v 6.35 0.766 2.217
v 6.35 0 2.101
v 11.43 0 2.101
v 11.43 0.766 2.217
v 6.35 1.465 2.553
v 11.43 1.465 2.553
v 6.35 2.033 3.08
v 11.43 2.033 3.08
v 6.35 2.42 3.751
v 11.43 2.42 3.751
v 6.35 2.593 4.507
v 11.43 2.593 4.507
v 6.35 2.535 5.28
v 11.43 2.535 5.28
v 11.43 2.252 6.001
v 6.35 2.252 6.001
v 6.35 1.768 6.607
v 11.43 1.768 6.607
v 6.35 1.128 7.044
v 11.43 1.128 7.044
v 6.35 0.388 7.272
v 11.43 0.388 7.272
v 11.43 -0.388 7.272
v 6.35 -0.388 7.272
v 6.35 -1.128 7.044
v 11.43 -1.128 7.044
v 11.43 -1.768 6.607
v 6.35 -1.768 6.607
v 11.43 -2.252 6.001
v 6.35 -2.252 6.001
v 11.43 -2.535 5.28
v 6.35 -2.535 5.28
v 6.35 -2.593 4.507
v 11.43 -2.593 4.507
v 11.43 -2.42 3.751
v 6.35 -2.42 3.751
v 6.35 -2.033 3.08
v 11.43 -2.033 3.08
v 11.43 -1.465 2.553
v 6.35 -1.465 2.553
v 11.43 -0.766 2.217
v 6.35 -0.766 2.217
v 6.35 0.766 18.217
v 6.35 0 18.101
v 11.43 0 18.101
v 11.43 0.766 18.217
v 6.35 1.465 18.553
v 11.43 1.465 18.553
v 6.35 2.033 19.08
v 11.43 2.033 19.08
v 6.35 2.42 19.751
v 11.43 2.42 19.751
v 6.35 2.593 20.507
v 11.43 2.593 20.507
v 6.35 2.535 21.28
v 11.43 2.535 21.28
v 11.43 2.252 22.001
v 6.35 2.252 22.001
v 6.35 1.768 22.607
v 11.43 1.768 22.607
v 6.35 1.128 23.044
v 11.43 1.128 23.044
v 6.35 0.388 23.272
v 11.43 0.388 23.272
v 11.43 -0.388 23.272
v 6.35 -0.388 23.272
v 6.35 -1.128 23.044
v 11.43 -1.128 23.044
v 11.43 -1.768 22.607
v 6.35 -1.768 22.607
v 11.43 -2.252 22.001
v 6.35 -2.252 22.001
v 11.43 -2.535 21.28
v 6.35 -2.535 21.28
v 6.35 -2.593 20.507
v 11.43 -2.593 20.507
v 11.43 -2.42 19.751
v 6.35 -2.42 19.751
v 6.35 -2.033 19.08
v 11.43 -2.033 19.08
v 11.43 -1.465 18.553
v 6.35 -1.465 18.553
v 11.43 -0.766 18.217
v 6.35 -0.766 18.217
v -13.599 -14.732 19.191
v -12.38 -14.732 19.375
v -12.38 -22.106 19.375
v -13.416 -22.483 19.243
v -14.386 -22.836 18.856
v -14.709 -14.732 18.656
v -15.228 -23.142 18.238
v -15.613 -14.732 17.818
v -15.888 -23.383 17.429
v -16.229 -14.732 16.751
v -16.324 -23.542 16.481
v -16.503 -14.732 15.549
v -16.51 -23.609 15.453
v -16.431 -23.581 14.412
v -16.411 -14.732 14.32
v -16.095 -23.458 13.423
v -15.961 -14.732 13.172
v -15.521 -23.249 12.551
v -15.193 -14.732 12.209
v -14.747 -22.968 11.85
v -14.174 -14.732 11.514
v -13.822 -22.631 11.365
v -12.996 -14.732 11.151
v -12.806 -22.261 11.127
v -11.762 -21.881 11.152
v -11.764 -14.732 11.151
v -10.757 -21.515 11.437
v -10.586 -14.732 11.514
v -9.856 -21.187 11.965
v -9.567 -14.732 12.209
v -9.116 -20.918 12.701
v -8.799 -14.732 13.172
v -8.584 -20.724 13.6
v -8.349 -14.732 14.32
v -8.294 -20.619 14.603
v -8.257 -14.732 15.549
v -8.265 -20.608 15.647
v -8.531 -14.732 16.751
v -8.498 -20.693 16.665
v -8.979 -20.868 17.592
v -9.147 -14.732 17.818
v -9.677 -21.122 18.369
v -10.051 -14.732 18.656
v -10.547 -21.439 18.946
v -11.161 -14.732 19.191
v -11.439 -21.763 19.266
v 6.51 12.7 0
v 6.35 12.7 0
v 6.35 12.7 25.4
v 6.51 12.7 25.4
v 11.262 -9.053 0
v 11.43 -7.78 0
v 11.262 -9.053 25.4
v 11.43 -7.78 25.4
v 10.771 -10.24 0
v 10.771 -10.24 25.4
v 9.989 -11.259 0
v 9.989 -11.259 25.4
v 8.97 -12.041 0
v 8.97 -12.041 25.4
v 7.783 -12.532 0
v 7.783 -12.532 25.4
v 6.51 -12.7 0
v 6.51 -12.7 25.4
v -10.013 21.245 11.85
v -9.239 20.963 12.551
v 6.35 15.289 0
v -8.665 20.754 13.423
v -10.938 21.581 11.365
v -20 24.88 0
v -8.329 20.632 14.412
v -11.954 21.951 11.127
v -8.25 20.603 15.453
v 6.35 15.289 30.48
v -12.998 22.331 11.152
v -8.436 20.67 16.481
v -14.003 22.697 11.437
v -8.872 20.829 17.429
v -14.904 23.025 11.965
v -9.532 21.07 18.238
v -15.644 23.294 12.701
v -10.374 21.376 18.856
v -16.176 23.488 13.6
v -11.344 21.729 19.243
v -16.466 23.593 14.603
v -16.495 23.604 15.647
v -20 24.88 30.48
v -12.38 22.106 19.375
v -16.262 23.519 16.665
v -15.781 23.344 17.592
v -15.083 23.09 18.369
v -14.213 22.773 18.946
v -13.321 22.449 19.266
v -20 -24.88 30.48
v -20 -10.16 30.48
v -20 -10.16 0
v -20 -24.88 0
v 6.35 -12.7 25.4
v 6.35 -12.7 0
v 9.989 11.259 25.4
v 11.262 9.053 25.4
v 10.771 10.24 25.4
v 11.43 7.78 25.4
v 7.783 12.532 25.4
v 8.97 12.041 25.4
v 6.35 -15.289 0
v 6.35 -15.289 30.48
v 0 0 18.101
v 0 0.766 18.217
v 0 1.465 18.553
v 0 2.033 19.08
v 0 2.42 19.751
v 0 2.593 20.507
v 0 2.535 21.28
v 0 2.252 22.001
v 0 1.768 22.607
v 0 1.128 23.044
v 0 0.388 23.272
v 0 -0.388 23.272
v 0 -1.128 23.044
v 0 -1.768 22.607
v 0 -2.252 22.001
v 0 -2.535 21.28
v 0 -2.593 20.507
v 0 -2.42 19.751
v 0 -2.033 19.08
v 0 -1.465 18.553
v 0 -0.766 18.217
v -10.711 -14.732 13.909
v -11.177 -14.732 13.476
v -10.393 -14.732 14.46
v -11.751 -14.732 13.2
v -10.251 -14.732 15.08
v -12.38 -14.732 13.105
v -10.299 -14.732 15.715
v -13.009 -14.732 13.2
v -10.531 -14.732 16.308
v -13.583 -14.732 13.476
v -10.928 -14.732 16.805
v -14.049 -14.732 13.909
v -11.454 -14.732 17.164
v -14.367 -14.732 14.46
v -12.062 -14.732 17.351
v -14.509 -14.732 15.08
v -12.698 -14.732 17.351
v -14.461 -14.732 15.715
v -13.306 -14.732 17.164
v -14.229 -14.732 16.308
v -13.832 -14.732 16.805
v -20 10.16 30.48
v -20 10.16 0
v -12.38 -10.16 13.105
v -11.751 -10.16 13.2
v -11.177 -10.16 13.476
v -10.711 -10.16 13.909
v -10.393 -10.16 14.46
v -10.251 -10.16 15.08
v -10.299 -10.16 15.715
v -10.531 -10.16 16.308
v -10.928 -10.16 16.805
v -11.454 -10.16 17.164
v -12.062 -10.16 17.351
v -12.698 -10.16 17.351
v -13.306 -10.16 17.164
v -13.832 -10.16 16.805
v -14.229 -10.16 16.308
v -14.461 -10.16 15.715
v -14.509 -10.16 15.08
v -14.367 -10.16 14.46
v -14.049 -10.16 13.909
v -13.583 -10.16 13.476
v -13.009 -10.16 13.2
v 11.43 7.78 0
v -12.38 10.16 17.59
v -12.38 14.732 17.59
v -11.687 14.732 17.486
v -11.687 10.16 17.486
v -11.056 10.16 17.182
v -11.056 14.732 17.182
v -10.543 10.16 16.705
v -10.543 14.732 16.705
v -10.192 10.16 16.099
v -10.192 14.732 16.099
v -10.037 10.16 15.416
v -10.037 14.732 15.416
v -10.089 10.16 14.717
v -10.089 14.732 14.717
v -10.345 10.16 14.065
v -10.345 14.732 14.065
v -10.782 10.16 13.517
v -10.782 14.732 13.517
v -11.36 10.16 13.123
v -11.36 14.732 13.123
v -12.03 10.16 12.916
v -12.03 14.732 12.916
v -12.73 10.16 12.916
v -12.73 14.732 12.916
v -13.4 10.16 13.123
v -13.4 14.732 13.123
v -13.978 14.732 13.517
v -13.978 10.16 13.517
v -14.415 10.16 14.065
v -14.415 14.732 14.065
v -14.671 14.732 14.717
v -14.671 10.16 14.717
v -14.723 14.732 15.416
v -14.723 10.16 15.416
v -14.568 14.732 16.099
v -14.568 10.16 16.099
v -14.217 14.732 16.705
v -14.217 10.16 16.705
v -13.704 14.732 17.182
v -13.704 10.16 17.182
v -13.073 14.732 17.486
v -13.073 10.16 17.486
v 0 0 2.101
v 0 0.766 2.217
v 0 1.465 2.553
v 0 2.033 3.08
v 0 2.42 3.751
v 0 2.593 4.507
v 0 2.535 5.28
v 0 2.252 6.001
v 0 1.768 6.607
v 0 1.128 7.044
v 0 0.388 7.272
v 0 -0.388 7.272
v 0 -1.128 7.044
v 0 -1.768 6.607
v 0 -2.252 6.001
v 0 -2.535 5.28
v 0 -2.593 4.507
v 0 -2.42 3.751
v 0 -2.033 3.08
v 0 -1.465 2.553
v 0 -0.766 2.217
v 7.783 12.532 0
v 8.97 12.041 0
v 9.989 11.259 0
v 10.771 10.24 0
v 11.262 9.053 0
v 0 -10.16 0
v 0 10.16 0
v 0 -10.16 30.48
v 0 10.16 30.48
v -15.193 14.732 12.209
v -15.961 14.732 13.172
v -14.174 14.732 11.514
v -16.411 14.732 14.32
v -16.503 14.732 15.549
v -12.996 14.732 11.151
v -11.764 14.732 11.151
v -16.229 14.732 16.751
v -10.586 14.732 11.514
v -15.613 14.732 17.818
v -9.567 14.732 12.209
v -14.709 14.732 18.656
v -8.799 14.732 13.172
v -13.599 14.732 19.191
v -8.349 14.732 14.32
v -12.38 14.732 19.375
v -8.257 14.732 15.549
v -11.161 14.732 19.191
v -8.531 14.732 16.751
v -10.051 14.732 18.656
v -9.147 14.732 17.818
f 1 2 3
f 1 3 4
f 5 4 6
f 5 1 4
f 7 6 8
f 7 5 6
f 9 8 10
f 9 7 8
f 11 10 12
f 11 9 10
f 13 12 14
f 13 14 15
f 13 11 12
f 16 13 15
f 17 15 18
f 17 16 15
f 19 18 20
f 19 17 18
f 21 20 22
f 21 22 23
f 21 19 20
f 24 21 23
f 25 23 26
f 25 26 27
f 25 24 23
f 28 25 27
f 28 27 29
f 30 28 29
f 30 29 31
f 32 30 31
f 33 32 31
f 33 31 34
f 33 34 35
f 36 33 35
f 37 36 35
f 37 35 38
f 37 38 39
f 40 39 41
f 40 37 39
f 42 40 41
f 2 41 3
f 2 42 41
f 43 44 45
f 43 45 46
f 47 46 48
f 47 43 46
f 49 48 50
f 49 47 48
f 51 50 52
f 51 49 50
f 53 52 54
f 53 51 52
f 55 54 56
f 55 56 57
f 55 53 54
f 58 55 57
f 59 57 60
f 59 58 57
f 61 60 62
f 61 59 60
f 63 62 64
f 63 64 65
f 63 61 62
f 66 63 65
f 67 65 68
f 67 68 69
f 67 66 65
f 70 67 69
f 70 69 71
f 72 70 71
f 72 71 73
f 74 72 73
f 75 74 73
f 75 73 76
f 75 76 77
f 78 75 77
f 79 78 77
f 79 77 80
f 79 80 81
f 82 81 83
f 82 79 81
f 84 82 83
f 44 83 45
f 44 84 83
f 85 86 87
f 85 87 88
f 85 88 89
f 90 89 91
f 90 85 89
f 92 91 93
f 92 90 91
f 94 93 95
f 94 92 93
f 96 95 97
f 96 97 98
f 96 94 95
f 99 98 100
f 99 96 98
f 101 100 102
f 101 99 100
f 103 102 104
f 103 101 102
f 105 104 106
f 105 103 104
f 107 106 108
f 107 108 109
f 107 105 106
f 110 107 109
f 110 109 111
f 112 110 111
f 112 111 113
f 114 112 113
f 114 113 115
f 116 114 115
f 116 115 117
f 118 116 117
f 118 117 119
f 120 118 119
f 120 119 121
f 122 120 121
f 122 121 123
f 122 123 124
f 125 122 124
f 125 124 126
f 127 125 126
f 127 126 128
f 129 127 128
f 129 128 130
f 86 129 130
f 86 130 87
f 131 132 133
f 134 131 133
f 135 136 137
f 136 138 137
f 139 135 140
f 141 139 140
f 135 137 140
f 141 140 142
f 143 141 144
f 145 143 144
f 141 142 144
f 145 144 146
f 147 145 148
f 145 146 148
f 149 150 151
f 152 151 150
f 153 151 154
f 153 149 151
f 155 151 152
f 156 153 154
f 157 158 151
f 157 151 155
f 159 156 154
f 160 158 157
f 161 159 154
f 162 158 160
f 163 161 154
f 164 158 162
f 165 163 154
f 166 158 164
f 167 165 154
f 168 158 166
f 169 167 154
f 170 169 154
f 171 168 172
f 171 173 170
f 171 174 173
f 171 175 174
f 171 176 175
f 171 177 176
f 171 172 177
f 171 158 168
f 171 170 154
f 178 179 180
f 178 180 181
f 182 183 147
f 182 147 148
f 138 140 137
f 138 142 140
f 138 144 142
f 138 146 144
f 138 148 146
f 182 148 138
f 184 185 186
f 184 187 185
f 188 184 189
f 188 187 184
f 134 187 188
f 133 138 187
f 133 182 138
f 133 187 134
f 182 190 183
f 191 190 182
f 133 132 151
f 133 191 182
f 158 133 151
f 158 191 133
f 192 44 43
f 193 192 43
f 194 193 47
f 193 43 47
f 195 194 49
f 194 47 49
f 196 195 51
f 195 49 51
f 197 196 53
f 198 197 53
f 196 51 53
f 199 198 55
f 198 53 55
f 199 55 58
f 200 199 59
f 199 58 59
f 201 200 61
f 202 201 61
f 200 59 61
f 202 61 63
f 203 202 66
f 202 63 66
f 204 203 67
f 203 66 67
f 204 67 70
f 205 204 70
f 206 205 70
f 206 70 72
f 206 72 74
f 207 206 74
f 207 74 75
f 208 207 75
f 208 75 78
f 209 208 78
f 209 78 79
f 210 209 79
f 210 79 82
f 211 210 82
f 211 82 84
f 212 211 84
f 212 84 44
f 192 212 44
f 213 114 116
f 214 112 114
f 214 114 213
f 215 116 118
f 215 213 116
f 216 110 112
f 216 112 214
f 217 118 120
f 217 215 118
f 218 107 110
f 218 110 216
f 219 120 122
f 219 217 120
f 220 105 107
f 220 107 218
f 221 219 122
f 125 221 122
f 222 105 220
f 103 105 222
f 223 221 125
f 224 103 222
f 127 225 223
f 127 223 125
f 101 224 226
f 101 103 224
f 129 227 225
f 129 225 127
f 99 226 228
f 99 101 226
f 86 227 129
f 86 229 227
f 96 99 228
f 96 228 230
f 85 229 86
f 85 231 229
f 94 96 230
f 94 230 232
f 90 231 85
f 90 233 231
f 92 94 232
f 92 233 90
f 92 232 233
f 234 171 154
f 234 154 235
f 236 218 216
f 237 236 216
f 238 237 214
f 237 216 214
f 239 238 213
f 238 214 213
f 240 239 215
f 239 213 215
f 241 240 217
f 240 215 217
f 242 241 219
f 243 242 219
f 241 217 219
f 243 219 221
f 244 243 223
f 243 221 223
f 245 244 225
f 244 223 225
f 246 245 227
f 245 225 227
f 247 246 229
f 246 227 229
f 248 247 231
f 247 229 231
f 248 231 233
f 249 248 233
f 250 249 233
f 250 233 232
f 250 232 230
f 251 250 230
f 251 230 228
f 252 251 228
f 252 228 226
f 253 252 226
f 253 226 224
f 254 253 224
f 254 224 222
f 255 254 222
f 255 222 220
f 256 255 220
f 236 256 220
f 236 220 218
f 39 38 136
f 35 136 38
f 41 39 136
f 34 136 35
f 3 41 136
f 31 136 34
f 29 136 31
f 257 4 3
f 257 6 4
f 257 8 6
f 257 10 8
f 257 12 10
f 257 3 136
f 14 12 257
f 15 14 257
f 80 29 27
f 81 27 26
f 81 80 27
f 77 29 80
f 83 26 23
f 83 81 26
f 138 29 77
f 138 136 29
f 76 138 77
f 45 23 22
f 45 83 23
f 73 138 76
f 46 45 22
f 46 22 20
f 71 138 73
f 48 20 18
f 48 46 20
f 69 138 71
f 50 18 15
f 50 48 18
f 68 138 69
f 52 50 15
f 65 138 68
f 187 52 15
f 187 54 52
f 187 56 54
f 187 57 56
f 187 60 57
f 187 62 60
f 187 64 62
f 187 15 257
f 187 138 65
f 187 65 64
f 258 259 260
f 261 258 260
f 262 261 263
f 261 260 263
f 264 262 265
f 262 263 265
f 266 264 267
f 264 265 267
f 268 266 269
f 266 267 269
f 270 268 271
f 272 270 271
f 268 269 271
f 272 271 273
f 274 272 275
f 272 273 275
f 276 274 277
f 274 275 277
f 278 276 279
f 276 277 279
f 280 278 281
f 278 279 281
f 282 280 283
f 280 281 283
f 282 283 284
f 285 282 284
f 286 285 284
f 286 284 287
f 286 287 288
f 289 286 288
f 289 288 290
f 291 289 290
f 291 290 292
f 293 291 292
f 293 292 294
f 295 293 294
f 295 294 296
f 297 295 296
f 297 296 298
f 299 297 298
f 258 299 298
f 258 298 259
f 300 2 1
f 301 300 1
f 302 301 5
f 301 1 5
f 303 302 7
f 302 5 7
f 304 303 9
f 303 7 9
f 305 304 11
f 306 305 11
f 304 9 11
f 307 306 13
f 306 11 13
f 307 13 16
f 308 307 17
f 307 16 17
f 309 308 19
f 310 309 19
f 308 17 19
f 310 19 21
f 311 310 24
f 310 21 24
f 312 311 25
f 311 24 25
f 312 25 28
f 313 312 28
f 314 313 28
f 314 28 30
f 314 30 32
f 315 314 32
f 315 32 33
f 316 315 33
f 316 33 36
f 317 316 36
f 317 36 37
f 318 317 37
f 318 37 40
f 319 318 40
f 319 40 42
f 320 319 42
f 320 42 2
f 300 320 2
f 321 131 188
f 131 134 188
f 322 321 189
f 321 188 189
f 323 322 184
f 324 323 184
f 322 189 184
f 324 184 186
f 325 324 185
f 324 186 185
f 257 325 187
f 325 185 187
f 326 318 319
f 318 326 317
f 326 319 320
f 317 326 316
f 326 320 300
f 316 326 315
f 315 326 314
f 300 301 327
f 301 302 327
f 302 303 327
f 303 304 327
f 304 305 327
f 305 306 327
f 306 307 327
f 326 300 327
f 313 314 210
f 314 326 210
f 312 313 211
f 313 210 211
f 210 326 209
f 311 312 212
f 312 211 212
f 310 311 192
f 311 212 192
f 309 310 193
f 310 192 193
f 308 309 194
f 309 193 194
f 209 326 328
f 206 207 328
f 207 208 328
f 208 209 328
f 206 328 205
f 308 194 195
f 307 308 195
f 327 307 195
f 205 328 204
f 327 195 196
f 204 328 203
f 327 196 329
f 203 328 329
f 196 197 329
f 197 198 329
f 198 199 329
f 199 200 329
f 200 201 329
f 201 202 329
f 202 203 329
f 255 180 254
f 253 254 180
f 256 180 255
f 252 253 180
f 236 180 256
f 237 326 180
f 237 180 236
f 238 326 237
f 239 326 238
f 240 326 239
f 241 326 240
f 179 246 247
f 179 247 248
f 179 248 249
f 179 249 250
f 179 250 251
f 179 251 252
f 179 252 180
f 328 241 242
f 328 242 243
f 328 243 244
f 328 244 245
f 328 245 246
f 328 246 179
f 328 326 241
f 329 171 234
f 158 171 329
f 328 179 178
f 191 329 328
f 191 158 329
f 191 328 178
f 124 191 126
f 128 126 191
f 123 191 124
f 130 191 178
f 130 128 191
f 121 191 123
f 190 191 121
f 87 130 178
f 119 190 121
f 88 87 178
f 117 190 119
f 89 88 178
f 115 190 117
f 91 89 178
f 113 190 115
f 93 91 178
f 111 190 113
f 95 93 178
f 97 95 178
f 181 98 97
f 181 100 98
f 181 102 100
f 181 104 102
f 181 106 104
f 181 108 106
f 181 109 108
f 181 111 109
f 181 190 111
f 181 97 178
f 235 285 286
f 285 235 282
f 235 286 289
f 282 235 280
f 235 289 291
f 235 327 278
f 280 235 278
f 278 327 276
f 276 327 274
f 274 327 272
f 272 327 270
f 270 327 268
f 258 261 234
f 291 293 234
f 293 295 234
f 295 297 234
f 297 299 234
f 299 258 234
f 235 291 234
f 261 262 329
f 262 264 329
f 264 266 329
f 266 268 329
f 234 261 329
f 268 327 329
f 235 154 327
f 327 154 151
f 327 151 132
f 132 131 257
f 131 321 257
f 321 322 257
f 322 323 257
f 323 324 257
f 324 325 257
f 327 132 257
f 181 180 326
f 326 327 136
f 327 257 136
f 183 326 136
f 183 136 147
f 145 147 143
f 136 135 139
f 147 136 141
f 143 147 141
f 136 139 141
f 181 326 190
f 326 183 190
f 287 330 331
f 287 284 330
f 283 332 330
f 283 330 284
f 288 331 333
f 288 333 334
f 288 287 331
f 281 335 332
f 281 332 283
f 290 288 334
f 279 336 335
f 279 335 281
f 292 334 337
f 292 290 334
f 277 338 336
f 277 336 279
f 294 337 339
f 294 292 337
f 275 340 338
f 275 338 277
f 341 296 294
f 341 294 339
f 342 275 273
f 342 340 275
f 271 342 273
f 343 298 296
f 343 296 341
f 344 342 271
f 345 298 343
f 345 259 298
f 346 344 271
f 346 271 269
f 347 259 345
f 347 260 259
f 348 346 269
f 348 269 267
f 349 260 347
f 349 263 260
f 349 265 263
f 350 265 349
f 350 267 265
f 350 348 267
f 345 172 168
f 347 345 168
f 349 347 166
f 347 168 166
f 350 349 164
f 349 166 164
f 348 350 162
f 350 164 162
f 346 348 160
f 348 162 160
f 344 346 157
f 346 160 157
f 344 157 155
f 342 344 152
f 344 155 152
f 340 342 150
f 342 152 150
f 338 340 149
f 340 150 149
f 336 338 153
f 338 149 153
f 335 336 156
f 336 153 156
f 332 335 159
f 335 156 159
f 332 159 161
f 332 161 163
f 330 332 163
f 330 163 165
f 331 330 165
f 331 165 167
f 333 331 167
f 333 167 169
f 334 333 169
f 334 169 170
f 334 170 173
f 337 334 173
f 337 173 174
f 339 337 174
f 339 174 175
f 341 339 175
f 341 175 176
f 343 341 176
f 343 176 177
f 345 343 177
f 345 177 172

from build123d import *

# Parameters (mm, degrees)
SKETCH3_W           = 50.8
SKETCH3_H           = 30.48
BOSS_EXTRUDE1_DEPTH = 6.35
SKETCH4_W           = 15.24
SKETCH4_H           = 30.48
BOSS_EXTRUDE2_DEPTH = 20
SKETCH5_R           = 4.135
CUT_EXTRUDE1_DEPTH  = 10.668
SKETCH6_R           = 2.35
CUT_EXTRUDE2_DEPTH  = 8
CUT_EXTRUDE3_START  = -10.668
SKETCH7_R           = 4.135
CUT_EXTRUDE3_DEPTH  = 10.668
SKETCH8_R           = 2.135
CUT_EXTRUDE4_DEPTH  = 8
SKETCH10_W          = 25.4
SKETCH10_H          = 25.4
SKETCH10_R          = 2.6
BOSS_EXTRUDE4_DEPTH = 5.08
CHAMFER1_SIZE       = 10.111093108
CHAMFER1_SIZE_2     = 27.78
FILLET2_R           = 4.92
SKETCH12_R          = 2.6
CUT_EXTRUDE6_DEPTH  = 48.353389985
SKETCH13_R          = 2.6
CUT_EXTRUDE7_DEPTH  = 48.353389985


with BuildPart() as part:
    # Sketch3 → Boss-Extrude1 (new body)
    with BuildSketch(Plane.YZ):
        with Locations((0, 15.24)):
            Rectangle(SKETCH3_W, SKETCH3_H)
    extrude(amount=BOSS_EXTRUDE1_DEPTH)

    # Sketch4 → Boss-Extrude2 (add)
    with BuildSketch(Plane(origin=(0, 0, 0), x_dir=(0, -1, 0), z_dir=(-1, 0, 0))):
        with Locations((-17.78, 15.24)):
            Rectangle(SKETCH4_W, SKETCH4_H)
        with Locations((17.78, 15.24)):
            Rectangle(SKETCH4_W, SKETCH4_H)
    extrude(amount=BOSS_EXTRUDE2_DEPTH)

    # Sketch5 → Cut-Extrude1 (cut)
    with BuildSketch(Plane(origin=(0, 25.4, 0), x_dir=(-1, 0, 0), z_dir=(0, 1, 0))):
        with Locations(Location((12.38, 15.24, 0), (0, 0, 90))):
            Circle(SKETCH5_R)
    extrude(amount=-CUT_EXTRUDE1_DEPTH, mode=Mode.SUBTRACT)

    # Sketch6 → Cut-Extrude2 (cut)
    with BuildSketch(Plane(origin=(0, 14.732, 0), x_dir=(-1, 0, 0), z_dir=(0, 1, 0))):
        with Locations(Location((12.38, 15.24, 0), (0, 0, 90))):
            Circle(SKETCH6_R)
    extrude(amount=-CUT_EXTRUDE2_DEPTH, mode=Mode.SUBTRACT)

    # Sketch7 → Cut-Extrude3 (cut)
    with BuildSketch(Plane.XZ.offset(25.4).offset(CUT_EXTRUDE3_START)):
        with Locations(Location((-12.38, 15.24, 0), (0, 0, 90))):
            Circle(SKETCH7_R)
    extrude(amount=CUT_EXTRUDE3_DEPTH, mode=Mode.SUBTRACT)

    # Sketch8 → Cut-Extrude4 (cut)
    with BuildSketch(Plane.XZ.offset(14.732)):
        with Locations(Location((-12.38, 15.24, 0), (0, 0, 270))):
            Circle(SKETCH8_R)
    extrude(amount=-CUT_EXTRUDE4_DEPTH, mode=Mode.SUBTRACT)

    # Sketch10 → Boss-Extrude4 (add)
    with BuildSketch(Plane.YZ.offset(6.35)):
        with Locations((0, 12.7)):
            Rectangle(SKETCH10_W, SKETCH10_H)
        with Locations(Location((0, 20.701, 0), (0, 0, 270))):
            Circle(SKETCH10_R, mode=Mode.SUBTRACT)
        with Locations(Location((0, 4.701, 0), (0, 0, 270))):
            Circle(SKETCH10_R, mode=Mode.SUBTRACT)
    extrude(amount=BOSS_EXTRUDE4_DEPTH)

    # Chamfer1
    # the kernel refuses this chamfer: 27.78, 10.111093108 mm, written as the material it takes off along each edge
    with BuildSketch(Plane(origin=(6.35, 25.4, 102.54672967), x_dir=(0.09904090225204921, -0.9950833631817487, 0), z_dir=(0, 0, -1)), Plane(origin=(6.35, -25.4, -72.06672967), x_dir=(0.09904090225204921, 0.9950833631817487, 0), z_dir=(0, 0, 1))) as chamfer1_piece_1:
        Polygon((CHAMFER1_SIZE * 0.995083363173, CHAMFER1_SIZE * 0.0990409022512), (-CHAMFER1_SIZE_2 * 0.099040902252, CHAMFER1_SIZE_2 * 0.995083363182), (0, 0), align=None)
    extrude(amount=174.613459341, mode=Mode.SUBTRACT)

    # Fillet2
    fillet2_edges = [part.edges().sort_by_distance(p)[0] for p in [
        (11.43, -12.7, 12.7),
        (11.43, 12.7, 12.7),
    ]]
    fillet(fillet2_edges, radius=FILLET2_R)

    # Sketch12 → Cut-Extrude6 (cut, through all)
    with BuildSketch(Plane.YZ.offset(6.35)):
        with Locations(Location((0, 20.701, 0), (0, 0, 270))):
            Circle(SKETCH12_R)
    extrude(amount=-CUT_EXTRUDE6_DEPTH, mode=Mode.SUBTRACT)

    # Sketch13 → Cut-Extrude7 (cut, through all)
    with BuildSketch(Plane.YZ.offset(6.35)):
        with Locations(Location((0, 4.701, 0), (0, 0, 270))):
            Circle(SKETCH13_R)
    extrude(amount=-CUT_EXTRUDE7_DEPTH, mode=Mode.SUBTRACT)


solid = part.part
